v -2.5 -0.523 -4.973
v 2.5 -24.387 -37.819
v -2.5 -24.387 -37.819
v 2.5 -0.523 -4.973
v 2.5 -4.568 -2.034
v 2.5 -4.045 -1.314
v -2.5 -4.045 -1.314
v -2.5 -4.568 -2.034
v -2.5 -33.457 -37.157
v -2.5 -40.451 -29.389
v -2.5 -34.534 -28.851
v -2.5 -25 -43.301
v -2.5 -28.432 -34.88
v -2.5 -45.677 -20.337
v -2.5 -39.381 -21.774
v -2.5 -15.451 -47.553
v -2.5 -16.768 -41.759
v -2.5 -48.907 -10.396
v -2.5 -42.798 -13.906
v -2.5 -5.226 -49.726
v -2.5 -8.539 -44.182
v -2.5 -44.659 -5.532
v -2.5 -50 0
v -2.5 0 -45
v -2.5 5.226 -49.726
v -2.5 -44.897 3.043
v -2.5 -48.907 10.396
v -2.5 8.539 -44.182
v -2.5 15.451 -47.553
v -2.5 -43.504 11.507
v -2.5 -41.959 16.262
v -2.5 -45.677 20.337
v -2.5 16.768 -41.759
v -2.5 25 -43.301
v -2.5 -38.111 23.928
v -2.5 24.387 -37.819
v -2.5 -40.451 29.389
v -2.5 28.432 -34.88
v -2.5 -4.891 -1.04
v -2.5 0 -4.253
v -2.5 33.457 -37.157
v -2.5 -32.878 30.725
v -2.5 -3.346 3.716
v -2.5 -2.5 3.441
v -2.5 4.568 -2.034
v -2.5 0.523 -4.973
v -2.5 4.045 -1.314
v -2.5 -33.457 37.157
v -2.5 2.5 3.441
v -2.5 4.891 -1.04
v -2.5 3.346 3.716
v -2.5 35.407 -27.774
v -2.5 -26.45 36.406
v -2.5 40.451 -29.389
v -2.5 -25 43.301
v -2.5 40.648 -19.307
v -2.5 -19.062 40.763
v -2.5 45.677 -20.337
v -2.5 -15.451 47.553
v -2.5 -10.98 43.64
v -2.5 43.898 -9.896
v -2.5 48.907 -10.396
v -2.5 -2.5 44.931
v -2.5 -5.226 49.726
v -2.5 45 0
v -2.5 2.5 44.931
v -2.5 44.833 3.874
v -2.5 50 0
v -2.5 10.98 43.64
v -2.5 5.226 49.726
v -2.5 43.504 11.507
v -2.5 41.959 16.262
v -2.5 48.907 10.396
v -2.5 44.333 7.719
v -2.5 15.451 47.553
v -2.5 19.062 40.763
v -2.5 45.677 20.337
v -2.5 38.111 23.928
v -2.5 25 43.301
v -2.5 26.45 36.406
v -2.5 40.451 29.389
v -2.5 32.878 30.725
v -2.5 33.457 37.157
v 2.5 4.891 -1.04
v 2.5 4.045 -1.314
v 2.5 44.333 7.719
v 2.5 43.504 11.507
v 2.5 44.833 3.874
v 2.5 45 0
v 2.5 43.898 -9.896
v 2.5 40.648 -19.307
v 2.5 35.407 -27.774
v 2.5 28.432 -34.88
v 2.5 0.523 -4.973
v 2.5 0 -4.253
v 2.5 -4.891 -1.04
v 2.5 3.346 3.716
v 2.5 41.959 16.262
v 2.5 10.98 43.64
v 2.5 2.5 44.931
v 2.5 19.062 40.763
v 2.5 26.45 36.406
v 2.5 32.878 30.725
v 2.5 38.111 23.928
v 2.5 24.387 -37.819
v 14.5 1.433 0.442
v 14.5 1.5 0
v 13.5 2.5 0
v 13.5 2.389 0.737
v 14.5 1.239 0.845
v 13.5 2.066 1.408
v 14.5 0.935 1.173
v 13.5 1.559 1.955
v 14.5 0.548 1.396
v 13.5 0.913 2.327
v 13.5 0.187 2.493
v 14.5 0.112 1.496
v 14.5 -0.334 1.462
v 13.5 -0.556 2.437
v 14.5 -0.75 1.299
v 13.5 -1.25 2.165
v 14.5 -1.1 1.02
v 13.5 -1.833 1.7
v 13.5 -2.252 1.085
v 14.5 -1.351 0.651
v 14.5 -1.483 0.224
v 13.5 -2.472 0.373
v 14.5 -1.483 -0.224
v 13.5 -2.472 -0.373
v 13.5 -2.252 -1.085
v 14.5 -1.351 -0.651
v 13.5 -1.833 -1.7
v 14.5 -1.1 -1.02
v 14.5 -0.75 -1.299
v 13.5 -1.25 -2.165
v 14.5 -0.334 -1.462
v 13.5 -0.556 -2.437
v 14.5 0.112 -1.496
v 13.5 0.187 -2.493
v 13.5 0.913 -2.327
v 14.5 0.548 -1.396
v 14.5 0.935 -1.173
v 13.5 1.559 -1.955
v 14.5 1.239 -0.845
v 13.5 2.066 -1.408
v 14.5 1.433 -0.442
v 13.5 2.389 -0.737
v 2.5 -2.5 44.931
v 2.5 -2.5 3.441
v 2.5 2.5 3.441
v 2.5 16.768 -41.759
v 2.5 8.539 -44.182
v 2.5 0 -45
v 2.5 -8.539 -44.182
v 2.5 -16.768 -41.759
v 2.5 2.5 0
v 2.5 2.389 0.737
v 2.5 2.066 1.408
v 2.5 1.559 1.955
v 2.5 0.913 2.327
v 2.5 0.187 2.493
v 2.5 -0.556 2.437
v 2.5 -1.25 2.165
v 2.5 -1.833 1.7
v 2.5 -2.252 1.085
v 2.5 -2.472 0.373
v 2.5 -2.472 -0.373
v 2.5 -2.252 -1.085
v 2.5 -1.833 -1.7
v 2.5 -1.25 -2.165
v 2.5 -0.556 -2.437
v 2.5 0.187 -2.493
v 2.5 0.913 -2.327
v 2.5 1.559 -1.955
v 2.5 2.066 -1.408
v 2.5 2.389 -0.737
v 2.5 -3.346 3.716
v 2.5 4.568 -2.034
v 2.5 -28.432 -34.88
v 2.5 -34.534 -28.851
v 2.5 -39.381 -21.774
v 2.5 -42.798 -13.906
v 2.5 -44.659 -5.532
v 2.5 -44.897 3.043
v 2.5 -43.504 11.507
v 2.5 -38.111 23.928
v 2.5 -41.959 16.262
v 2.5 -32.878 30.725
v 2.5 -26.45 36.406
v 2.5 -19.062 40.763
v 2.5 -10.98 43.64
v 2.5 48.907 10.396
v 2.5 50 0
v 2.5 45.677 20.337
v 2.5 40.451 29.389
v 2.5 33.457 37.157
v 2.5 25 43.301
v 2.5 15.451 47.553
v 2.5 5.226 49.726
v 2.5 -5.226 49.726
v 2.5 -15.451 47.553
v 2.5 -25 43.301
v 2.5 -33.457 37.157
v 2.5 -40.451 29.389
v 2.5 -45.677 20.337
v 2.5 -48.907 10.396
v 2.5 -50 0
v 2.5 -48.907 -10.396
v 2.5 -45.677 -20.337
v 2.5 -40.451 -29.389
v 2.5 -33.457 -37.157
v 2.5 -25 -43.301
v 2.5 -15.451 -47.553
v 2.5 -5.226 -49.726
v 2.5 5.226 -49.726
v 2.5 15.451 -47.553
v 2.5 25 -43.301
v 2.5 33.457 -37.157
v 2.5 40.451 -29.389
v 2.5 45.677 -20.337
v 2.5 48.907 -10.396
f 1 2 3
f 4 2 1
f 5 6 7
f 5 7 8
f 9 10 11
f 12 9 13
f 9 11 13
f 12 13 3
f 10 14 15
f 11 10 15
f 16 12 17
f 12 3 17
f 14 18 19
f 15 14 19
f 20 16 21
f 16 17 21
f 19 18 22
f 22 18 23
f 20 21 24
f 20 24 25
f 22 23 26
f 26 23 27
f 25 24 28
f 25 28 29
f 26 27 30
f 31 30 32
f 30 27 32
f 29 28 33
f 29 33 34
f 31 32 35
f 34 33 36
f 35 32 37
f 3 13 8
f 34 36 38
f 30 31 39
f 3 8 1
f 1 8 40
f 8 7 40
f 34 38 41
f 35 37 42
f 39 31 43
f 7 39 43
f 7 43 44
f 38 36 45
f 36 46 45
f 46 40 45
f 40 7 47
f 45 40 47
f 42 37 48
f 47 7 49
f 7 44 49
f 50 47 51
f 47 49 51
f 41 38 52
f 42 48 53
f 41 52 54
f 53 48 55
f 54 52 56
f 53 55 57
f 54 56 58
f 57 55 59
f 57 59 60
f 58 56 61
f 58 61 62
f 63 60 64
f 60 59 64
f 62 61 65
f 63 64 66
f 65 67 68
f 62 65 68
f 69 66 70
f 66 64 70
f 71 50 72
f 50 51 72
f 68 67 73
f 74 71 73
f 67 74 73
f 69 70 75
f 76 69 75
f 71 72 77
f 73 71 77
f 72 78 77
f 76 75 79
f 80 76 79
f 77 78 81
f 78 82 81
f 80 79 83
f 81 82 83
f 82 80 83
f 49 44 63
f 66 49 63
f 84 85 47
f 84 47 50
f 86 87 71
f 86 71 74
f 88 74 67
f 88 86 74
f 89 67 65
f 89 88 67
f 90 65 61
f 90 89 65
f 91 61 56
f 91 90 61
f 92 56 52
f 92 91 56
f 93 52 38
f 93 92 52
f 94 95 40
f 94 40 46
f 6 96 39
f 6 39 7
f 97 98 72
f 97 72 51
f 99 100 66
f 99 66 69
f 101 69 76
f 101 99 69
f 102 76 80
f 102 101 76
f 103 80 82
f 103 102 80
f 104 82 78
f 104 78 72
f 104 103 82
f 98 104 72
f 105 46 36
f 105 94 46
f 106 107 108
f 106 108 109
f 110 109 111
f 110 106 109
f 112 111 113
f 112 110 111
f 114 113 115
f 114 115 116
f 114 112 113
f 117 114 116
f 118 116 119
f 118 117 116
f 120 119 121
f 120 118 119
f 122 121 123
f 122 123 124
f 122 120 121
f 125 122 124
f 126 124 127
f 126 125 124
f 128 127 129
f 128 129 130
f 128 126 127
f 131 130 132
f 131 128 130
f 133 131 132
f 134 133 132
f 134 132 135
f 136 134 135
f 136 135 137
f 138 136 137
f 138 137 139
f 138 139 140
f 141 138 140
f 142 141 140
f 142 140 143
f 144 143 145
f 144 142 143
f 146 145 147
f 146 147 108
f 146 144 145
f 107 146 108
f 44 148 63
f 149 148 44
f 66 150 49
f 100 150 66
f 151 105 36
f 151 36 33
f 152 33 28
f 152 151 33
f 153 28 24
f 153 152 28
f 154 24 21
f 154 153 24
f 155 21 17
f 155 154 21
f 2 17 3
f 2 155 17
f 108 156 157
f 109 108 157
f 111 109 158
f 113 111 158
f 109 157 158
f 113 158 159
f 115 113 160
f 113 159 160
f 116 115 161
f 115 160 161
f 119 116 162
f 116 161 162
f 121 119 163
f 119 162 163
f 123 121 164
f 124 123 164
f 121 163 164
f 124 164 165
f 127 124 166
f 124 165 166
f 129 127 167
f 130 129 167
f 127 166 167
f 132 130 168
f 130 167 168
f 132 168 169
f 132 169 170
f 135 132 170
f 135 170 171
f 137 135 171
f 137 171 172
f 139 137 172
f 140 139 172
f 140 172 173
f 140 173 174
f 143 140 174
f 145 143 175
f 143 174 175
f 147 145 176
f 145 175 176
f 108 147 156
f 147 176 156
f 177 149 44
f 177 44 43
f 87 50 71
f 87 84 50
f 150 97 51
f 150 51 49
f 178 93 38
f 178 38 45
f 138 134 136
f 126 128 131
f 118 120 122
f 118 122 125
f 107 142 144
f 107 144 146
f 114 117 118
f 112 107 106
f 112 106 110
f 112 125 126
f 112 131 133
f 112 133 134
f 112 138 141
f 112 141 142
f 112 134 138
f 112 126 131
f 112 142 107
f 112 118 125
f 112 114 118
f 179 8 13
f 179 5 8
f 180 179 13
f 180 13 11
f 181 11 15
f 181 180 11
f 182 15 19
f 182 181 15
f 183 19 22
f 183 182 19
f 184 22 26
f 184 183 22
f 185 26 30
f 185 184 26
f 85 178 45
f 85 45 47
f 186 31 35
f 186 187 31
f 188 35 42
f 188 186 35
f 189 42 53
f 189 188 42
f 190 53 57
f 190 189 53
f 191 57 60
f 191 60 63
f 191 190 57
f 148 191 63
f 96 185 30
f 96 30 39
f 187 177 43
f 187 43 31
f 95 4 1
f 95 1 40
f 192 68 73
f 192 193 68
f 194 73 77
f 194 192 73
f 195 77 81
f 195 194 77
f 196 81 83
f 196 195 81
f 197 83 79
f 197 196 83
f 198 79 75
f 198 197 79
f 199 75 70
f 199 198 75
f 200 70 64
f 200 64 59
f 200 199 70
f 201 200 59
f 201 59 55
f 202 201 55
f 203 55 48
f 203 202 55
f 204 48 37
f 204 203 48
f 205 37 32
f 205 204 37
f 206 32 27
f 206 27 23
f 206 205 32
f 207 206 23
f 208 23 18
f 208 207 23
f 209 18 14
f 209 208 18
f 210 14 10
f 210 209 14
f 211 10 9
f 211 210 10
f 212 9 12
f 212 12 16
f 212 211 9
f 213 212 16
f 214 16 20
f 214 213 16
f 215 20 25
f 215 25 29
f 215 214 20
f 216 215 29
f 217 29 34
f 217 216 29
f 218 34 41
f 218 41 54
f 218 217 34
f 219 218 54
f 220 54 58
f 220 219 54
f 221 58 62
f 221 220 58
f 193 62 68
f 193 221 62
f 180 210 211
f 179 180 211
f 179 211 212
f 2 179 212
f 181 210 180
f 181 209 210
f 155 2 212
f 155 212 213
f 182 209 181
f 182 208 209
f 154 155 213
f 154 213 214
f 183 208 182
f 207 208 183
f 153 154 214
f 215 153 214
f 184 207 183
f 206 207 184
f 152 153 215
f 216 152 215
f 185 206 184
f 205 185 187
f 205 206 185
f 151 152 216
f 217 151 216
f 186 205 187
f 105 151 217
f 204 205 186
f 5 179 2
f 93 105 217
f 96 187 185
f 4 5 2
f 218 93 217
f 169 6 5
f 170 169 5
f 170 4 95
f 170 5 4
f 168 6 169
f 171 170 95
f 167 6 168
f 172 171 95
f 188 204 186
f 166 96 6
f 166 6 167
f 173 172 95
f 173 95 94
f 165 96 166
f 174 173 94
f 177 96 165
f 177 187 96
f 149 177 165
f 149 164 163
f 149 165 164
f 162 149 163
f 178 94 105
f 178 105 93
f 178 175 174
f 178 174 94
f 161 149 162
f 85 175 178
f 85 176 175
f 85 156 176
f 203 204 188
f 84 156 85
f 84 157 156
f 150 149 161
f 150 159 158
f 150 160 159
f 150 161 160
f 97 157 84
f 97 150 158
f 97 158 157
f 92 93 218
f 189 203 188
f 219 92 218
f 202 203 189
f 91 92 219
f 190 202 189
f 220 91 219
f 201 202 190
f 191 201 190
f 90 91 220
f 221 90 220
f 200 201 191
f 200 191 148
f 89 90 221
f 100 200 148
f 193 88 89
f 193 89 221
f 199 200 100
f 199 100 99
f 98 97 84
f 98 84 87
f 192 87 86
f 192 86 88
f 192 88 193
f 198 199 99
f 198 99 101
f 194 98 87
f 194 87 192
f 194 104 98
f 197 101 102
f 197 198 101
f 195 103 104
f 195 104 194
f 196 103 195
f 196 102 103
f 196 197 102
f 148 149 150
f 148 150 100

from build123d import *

# Parameters (mm, degrees)
F0_R     = 50
F1_DEPTH = 2.5
F2_R     = 2.5
F3_DEPTH = 12
F4_SIZE  = 1


with BuildPart() as f1:
    # F0 (on Right) → F1 (new body, symmetric)
    with BuildSketch(Plane.YZ):
        Circle(F0_R)
        with BuildLine():
            ThreePointArc((2.5, 44.930501889), (26.4503363532, 36.4057647469), (41.958904116, 16.2619299402))
            ThreePointArc((41.958904116, 16.2619299402), (42.7975432333, 13.9057647469), (43.5039890879, 11.5066473588))
            ThreePointArc((43.5039890879, 11.5066473588), (44.6244300185, 5.8017450411), (45, 0))
            ThreePointArc((45, 0), (40.6475171403, -19.3074946672), (28.4320288744, -34.8800764633))
            ThreePointArc((28.4320288744, -34.8800764633), (26.4503363532, -36.4057647469), (24.3869439025, -37.8190027248))
            ThreePointArc((24.3869439025, -37.8190027248), (0, -45), (-24.3869439025, -37.8190027248))
            ThreePointArc((-24.3869439025, -37.8190027248), (-26.4503363532, -36.4057647469), (-28.4320288744, -34.8800764633))
            ThreePointArc((-28.4320288744, -34.8800764633), (-42.7975432333, -13.9057647469), (-43.5039890879, 11.5066473588))
            ThreePointArc((-43.5039890879, 11.5066473588), (-42.7975432333, 13.9057647469), (-41.958904116, 16.2619299402))
            ThreePointArc((-41.958904116, 16.2619299402), (-26.4503363532, 36.4057647469), (-2.5, 44.930501889))
            ThreePointArc((-2.5, 44.930501889), (0, 45), (2.5, 44.930501889))
        make_face(mode=Mode.SUBTRACT)
        with BuildLine():
            ThreePointArc((-2.5, 4.3301270189), (0, 5), (2.5, 4.3301270189))
            Line((2.5, 4.3301270189), (2.5, 44.930501889))
            ThreePointArc((2.5, 44.930501889), (0, 45), (-2.5, 44.930501889))
            Line((-2.5, 44.930501889), (-2.5, 4.3301270189))
        make_face()
        with BuildLine():
            ThreePointArc((-4.8907380037, -1.0395584541), (-4.7552825815, 1.5450849719), (-3.3456530318, 3.7157241274))
            Line((-3.3456530318, 3.7157241274), (-41.958904116, 16.2619299402))
            ThreePointArc((-41.958904116, 16.2619299402), (-42.7975432333, 13.9057647469), (-43.5039890879, 11.5066473588))
            Line((-43.5039890879, 11.5066473588), (-4.8907380037, -1.0395584541))
        make_face()
        with BuildLine():
            Line((-24.3869439025, -37.8190027248), (-0.5226423163, -4.9726094768))
            ThreePointArc((-0.5226423163, -4.9726094768), (-2.9389262615, -4.0450849719), (-4.5677272882, -2.0336832154))
            Line((-4.5677272882, -2.0336832154), (-28.4320288744, -34.8800764633))
            ThreePointArc((-28.4320288744, -34.8800764633), (-26.4503363532, -36.4057647469), (-24.3869439025, -37.8190027248))
        make_face()
        with BuildLine():
            Line((28.4320288744, -34.8800764633), (4.5677272882, -2.0336832154))
            ThreePointArc((4.5677272882, -2.0336832154), (2.9389262615, -4.0450849719), (0.5226423163, -4.9726094768))
            Line((0.5226423163, -4.9726094768), (24.3869439025, -37.8190027248))
            ThreePointArc((24.3869439025, -37.8190027248), (26.4503363532, -36.4057647469), (28.4320288744, -34.8800764633))
        make_face()
        with BuildLine():
            ThreePointArc((3.3456530318, 3.7157241274), (4.5677272882, 2.0336832154), (5, 0))
            ThreePointArc((5, 0), (4.9726094768, -0.5226423163), (4.8907380037, -1.0395584541))
            Line((4.8907380037, -1.0395584541), (43.5039890879, 11.5066473588))
            ThreePointArc((43.5039890879, 11.5066473588), (42.7975432333, 13.9057647469), (41.958904116, 16.2619299402))
            Line((41.958904116, 16.2619299402), (3.3456530318, 3.7157241274))
        make_face()
        Polygon((2.5, 0.8122992406), (2.5, 3.4409548012), (0, 2.6286555606), (-2.5, 3.4409548012), (-2.5, 0.8122992406), (-4.0450849719, -1.3143277803), (-1.5450849719, -2.1266270209), (0, -4.2532540418), (1.5450849719, -2.1266270209), (4.0450849719, -1.3143277803), align=None)
        with BuildLine():
            Line((2.5, 3.4409548012), (2.5, 4.3301270189))
            ThreePointArc((2.5, 4.3301270189), (0, 5), (-2.5, 4.3301270189))
            Line((-2.5, 4.3301270189), (-2.5, 3.4409548012))
            Line((-2.5, 3.4409548012), (0, 2.6286555606))
            Line((0, 2.6286555606), (2.5, 3.4409548012))
        make_face()
        with BuildLine():
            Line((-2.5, 3.4409548012), (-3.3456530318, 3.7157241274))
            ThreePointArc((-3.3456530318, 3.7157241274), (-4.7552825815, 1.5450849719), (-4.8907380037, -1.0395584541))
            Line((-4.8907380037, -1.0395584541), (-4.0450849719, -1.3143277803))
            Line((-4.0450849719, -1.3143277803), (-2.5, 0.8122992406))
            Line((-2.5, 0.8122992406), (-2.5, 3.4409548012))
        make_face()
        with BuildLine():
            ThreePointArc((-4.5677272882, -2.0336832154), (-2.9389262615, -4.0450849719), (-0.5226423163, -4.9726094768))
            Line((-0.5226423163, -4.9726094768), (0, -4.2532540418))
            Line((0, -4.2532540418), (-1.5450849719, -2.1266270209))
            Line((-1.5450849719, -2.1266270209), (-4.0450849719, -1.3143277803))
            Line((-4.0450849719, -1.3143277803), (-4.5677272882, -2.0336832154))
        make_face()
        with BuildLine():
            ThreePointArc((0.5226423163, -4.9726094768), (2.9389262615, -4.0450849719), (4.5677272882, -2.0336832154))
            Line((4.5677272882, -2.0336832154), (4.0450849719, -1.3143277803))
            Line((4.0450849719, -1.3143277803), (1.5450849719, -2.1266270209))
            Line((1.5450849719, -2.1266270209), (0, -4.2532540418))
            Line((0, -4.2532540418), (0.5226423163, -4.9726094768))
        make_face()
        with BuildLine():
            ThreePointArc((4.8907380037, -1.0395584541), (4.9726094768, -0.5226423163), (5, 0))
            ThreePointArc((5, 0), (4.5677272882, 2.0336832154), (3.3456530318, 3.7157241274))
            Line((3.3456530318, 3.7157241274), (2.5, 3.4409548012))
            Line((2.5, 3.4409548012), (2.5, 0.8122992406))
            Line((2.5, 0.8122992406), (4.0450849719, -1.3143277803))
            Line((4.0450849719, -1.3143277803), (4.8907380037, -1.0395584541))
        make_face()
    extrude(amount=F1_DEPTH, both=True)

    # F2 (on face) → F3 (join)
    with BuildSketch(Plane.YZ.offset(2.5)):
        Circle(F2_R)
    extrude(amount=F3_DEPTH)

    # F4
    f4_edges = [f1.edges().sort_by_distance(p)[0] for p in [
        (14.5, -2.5, 0),
    ]]
    chamfer(f4_edges, length=F4_SIZE)


solid = f1.part
